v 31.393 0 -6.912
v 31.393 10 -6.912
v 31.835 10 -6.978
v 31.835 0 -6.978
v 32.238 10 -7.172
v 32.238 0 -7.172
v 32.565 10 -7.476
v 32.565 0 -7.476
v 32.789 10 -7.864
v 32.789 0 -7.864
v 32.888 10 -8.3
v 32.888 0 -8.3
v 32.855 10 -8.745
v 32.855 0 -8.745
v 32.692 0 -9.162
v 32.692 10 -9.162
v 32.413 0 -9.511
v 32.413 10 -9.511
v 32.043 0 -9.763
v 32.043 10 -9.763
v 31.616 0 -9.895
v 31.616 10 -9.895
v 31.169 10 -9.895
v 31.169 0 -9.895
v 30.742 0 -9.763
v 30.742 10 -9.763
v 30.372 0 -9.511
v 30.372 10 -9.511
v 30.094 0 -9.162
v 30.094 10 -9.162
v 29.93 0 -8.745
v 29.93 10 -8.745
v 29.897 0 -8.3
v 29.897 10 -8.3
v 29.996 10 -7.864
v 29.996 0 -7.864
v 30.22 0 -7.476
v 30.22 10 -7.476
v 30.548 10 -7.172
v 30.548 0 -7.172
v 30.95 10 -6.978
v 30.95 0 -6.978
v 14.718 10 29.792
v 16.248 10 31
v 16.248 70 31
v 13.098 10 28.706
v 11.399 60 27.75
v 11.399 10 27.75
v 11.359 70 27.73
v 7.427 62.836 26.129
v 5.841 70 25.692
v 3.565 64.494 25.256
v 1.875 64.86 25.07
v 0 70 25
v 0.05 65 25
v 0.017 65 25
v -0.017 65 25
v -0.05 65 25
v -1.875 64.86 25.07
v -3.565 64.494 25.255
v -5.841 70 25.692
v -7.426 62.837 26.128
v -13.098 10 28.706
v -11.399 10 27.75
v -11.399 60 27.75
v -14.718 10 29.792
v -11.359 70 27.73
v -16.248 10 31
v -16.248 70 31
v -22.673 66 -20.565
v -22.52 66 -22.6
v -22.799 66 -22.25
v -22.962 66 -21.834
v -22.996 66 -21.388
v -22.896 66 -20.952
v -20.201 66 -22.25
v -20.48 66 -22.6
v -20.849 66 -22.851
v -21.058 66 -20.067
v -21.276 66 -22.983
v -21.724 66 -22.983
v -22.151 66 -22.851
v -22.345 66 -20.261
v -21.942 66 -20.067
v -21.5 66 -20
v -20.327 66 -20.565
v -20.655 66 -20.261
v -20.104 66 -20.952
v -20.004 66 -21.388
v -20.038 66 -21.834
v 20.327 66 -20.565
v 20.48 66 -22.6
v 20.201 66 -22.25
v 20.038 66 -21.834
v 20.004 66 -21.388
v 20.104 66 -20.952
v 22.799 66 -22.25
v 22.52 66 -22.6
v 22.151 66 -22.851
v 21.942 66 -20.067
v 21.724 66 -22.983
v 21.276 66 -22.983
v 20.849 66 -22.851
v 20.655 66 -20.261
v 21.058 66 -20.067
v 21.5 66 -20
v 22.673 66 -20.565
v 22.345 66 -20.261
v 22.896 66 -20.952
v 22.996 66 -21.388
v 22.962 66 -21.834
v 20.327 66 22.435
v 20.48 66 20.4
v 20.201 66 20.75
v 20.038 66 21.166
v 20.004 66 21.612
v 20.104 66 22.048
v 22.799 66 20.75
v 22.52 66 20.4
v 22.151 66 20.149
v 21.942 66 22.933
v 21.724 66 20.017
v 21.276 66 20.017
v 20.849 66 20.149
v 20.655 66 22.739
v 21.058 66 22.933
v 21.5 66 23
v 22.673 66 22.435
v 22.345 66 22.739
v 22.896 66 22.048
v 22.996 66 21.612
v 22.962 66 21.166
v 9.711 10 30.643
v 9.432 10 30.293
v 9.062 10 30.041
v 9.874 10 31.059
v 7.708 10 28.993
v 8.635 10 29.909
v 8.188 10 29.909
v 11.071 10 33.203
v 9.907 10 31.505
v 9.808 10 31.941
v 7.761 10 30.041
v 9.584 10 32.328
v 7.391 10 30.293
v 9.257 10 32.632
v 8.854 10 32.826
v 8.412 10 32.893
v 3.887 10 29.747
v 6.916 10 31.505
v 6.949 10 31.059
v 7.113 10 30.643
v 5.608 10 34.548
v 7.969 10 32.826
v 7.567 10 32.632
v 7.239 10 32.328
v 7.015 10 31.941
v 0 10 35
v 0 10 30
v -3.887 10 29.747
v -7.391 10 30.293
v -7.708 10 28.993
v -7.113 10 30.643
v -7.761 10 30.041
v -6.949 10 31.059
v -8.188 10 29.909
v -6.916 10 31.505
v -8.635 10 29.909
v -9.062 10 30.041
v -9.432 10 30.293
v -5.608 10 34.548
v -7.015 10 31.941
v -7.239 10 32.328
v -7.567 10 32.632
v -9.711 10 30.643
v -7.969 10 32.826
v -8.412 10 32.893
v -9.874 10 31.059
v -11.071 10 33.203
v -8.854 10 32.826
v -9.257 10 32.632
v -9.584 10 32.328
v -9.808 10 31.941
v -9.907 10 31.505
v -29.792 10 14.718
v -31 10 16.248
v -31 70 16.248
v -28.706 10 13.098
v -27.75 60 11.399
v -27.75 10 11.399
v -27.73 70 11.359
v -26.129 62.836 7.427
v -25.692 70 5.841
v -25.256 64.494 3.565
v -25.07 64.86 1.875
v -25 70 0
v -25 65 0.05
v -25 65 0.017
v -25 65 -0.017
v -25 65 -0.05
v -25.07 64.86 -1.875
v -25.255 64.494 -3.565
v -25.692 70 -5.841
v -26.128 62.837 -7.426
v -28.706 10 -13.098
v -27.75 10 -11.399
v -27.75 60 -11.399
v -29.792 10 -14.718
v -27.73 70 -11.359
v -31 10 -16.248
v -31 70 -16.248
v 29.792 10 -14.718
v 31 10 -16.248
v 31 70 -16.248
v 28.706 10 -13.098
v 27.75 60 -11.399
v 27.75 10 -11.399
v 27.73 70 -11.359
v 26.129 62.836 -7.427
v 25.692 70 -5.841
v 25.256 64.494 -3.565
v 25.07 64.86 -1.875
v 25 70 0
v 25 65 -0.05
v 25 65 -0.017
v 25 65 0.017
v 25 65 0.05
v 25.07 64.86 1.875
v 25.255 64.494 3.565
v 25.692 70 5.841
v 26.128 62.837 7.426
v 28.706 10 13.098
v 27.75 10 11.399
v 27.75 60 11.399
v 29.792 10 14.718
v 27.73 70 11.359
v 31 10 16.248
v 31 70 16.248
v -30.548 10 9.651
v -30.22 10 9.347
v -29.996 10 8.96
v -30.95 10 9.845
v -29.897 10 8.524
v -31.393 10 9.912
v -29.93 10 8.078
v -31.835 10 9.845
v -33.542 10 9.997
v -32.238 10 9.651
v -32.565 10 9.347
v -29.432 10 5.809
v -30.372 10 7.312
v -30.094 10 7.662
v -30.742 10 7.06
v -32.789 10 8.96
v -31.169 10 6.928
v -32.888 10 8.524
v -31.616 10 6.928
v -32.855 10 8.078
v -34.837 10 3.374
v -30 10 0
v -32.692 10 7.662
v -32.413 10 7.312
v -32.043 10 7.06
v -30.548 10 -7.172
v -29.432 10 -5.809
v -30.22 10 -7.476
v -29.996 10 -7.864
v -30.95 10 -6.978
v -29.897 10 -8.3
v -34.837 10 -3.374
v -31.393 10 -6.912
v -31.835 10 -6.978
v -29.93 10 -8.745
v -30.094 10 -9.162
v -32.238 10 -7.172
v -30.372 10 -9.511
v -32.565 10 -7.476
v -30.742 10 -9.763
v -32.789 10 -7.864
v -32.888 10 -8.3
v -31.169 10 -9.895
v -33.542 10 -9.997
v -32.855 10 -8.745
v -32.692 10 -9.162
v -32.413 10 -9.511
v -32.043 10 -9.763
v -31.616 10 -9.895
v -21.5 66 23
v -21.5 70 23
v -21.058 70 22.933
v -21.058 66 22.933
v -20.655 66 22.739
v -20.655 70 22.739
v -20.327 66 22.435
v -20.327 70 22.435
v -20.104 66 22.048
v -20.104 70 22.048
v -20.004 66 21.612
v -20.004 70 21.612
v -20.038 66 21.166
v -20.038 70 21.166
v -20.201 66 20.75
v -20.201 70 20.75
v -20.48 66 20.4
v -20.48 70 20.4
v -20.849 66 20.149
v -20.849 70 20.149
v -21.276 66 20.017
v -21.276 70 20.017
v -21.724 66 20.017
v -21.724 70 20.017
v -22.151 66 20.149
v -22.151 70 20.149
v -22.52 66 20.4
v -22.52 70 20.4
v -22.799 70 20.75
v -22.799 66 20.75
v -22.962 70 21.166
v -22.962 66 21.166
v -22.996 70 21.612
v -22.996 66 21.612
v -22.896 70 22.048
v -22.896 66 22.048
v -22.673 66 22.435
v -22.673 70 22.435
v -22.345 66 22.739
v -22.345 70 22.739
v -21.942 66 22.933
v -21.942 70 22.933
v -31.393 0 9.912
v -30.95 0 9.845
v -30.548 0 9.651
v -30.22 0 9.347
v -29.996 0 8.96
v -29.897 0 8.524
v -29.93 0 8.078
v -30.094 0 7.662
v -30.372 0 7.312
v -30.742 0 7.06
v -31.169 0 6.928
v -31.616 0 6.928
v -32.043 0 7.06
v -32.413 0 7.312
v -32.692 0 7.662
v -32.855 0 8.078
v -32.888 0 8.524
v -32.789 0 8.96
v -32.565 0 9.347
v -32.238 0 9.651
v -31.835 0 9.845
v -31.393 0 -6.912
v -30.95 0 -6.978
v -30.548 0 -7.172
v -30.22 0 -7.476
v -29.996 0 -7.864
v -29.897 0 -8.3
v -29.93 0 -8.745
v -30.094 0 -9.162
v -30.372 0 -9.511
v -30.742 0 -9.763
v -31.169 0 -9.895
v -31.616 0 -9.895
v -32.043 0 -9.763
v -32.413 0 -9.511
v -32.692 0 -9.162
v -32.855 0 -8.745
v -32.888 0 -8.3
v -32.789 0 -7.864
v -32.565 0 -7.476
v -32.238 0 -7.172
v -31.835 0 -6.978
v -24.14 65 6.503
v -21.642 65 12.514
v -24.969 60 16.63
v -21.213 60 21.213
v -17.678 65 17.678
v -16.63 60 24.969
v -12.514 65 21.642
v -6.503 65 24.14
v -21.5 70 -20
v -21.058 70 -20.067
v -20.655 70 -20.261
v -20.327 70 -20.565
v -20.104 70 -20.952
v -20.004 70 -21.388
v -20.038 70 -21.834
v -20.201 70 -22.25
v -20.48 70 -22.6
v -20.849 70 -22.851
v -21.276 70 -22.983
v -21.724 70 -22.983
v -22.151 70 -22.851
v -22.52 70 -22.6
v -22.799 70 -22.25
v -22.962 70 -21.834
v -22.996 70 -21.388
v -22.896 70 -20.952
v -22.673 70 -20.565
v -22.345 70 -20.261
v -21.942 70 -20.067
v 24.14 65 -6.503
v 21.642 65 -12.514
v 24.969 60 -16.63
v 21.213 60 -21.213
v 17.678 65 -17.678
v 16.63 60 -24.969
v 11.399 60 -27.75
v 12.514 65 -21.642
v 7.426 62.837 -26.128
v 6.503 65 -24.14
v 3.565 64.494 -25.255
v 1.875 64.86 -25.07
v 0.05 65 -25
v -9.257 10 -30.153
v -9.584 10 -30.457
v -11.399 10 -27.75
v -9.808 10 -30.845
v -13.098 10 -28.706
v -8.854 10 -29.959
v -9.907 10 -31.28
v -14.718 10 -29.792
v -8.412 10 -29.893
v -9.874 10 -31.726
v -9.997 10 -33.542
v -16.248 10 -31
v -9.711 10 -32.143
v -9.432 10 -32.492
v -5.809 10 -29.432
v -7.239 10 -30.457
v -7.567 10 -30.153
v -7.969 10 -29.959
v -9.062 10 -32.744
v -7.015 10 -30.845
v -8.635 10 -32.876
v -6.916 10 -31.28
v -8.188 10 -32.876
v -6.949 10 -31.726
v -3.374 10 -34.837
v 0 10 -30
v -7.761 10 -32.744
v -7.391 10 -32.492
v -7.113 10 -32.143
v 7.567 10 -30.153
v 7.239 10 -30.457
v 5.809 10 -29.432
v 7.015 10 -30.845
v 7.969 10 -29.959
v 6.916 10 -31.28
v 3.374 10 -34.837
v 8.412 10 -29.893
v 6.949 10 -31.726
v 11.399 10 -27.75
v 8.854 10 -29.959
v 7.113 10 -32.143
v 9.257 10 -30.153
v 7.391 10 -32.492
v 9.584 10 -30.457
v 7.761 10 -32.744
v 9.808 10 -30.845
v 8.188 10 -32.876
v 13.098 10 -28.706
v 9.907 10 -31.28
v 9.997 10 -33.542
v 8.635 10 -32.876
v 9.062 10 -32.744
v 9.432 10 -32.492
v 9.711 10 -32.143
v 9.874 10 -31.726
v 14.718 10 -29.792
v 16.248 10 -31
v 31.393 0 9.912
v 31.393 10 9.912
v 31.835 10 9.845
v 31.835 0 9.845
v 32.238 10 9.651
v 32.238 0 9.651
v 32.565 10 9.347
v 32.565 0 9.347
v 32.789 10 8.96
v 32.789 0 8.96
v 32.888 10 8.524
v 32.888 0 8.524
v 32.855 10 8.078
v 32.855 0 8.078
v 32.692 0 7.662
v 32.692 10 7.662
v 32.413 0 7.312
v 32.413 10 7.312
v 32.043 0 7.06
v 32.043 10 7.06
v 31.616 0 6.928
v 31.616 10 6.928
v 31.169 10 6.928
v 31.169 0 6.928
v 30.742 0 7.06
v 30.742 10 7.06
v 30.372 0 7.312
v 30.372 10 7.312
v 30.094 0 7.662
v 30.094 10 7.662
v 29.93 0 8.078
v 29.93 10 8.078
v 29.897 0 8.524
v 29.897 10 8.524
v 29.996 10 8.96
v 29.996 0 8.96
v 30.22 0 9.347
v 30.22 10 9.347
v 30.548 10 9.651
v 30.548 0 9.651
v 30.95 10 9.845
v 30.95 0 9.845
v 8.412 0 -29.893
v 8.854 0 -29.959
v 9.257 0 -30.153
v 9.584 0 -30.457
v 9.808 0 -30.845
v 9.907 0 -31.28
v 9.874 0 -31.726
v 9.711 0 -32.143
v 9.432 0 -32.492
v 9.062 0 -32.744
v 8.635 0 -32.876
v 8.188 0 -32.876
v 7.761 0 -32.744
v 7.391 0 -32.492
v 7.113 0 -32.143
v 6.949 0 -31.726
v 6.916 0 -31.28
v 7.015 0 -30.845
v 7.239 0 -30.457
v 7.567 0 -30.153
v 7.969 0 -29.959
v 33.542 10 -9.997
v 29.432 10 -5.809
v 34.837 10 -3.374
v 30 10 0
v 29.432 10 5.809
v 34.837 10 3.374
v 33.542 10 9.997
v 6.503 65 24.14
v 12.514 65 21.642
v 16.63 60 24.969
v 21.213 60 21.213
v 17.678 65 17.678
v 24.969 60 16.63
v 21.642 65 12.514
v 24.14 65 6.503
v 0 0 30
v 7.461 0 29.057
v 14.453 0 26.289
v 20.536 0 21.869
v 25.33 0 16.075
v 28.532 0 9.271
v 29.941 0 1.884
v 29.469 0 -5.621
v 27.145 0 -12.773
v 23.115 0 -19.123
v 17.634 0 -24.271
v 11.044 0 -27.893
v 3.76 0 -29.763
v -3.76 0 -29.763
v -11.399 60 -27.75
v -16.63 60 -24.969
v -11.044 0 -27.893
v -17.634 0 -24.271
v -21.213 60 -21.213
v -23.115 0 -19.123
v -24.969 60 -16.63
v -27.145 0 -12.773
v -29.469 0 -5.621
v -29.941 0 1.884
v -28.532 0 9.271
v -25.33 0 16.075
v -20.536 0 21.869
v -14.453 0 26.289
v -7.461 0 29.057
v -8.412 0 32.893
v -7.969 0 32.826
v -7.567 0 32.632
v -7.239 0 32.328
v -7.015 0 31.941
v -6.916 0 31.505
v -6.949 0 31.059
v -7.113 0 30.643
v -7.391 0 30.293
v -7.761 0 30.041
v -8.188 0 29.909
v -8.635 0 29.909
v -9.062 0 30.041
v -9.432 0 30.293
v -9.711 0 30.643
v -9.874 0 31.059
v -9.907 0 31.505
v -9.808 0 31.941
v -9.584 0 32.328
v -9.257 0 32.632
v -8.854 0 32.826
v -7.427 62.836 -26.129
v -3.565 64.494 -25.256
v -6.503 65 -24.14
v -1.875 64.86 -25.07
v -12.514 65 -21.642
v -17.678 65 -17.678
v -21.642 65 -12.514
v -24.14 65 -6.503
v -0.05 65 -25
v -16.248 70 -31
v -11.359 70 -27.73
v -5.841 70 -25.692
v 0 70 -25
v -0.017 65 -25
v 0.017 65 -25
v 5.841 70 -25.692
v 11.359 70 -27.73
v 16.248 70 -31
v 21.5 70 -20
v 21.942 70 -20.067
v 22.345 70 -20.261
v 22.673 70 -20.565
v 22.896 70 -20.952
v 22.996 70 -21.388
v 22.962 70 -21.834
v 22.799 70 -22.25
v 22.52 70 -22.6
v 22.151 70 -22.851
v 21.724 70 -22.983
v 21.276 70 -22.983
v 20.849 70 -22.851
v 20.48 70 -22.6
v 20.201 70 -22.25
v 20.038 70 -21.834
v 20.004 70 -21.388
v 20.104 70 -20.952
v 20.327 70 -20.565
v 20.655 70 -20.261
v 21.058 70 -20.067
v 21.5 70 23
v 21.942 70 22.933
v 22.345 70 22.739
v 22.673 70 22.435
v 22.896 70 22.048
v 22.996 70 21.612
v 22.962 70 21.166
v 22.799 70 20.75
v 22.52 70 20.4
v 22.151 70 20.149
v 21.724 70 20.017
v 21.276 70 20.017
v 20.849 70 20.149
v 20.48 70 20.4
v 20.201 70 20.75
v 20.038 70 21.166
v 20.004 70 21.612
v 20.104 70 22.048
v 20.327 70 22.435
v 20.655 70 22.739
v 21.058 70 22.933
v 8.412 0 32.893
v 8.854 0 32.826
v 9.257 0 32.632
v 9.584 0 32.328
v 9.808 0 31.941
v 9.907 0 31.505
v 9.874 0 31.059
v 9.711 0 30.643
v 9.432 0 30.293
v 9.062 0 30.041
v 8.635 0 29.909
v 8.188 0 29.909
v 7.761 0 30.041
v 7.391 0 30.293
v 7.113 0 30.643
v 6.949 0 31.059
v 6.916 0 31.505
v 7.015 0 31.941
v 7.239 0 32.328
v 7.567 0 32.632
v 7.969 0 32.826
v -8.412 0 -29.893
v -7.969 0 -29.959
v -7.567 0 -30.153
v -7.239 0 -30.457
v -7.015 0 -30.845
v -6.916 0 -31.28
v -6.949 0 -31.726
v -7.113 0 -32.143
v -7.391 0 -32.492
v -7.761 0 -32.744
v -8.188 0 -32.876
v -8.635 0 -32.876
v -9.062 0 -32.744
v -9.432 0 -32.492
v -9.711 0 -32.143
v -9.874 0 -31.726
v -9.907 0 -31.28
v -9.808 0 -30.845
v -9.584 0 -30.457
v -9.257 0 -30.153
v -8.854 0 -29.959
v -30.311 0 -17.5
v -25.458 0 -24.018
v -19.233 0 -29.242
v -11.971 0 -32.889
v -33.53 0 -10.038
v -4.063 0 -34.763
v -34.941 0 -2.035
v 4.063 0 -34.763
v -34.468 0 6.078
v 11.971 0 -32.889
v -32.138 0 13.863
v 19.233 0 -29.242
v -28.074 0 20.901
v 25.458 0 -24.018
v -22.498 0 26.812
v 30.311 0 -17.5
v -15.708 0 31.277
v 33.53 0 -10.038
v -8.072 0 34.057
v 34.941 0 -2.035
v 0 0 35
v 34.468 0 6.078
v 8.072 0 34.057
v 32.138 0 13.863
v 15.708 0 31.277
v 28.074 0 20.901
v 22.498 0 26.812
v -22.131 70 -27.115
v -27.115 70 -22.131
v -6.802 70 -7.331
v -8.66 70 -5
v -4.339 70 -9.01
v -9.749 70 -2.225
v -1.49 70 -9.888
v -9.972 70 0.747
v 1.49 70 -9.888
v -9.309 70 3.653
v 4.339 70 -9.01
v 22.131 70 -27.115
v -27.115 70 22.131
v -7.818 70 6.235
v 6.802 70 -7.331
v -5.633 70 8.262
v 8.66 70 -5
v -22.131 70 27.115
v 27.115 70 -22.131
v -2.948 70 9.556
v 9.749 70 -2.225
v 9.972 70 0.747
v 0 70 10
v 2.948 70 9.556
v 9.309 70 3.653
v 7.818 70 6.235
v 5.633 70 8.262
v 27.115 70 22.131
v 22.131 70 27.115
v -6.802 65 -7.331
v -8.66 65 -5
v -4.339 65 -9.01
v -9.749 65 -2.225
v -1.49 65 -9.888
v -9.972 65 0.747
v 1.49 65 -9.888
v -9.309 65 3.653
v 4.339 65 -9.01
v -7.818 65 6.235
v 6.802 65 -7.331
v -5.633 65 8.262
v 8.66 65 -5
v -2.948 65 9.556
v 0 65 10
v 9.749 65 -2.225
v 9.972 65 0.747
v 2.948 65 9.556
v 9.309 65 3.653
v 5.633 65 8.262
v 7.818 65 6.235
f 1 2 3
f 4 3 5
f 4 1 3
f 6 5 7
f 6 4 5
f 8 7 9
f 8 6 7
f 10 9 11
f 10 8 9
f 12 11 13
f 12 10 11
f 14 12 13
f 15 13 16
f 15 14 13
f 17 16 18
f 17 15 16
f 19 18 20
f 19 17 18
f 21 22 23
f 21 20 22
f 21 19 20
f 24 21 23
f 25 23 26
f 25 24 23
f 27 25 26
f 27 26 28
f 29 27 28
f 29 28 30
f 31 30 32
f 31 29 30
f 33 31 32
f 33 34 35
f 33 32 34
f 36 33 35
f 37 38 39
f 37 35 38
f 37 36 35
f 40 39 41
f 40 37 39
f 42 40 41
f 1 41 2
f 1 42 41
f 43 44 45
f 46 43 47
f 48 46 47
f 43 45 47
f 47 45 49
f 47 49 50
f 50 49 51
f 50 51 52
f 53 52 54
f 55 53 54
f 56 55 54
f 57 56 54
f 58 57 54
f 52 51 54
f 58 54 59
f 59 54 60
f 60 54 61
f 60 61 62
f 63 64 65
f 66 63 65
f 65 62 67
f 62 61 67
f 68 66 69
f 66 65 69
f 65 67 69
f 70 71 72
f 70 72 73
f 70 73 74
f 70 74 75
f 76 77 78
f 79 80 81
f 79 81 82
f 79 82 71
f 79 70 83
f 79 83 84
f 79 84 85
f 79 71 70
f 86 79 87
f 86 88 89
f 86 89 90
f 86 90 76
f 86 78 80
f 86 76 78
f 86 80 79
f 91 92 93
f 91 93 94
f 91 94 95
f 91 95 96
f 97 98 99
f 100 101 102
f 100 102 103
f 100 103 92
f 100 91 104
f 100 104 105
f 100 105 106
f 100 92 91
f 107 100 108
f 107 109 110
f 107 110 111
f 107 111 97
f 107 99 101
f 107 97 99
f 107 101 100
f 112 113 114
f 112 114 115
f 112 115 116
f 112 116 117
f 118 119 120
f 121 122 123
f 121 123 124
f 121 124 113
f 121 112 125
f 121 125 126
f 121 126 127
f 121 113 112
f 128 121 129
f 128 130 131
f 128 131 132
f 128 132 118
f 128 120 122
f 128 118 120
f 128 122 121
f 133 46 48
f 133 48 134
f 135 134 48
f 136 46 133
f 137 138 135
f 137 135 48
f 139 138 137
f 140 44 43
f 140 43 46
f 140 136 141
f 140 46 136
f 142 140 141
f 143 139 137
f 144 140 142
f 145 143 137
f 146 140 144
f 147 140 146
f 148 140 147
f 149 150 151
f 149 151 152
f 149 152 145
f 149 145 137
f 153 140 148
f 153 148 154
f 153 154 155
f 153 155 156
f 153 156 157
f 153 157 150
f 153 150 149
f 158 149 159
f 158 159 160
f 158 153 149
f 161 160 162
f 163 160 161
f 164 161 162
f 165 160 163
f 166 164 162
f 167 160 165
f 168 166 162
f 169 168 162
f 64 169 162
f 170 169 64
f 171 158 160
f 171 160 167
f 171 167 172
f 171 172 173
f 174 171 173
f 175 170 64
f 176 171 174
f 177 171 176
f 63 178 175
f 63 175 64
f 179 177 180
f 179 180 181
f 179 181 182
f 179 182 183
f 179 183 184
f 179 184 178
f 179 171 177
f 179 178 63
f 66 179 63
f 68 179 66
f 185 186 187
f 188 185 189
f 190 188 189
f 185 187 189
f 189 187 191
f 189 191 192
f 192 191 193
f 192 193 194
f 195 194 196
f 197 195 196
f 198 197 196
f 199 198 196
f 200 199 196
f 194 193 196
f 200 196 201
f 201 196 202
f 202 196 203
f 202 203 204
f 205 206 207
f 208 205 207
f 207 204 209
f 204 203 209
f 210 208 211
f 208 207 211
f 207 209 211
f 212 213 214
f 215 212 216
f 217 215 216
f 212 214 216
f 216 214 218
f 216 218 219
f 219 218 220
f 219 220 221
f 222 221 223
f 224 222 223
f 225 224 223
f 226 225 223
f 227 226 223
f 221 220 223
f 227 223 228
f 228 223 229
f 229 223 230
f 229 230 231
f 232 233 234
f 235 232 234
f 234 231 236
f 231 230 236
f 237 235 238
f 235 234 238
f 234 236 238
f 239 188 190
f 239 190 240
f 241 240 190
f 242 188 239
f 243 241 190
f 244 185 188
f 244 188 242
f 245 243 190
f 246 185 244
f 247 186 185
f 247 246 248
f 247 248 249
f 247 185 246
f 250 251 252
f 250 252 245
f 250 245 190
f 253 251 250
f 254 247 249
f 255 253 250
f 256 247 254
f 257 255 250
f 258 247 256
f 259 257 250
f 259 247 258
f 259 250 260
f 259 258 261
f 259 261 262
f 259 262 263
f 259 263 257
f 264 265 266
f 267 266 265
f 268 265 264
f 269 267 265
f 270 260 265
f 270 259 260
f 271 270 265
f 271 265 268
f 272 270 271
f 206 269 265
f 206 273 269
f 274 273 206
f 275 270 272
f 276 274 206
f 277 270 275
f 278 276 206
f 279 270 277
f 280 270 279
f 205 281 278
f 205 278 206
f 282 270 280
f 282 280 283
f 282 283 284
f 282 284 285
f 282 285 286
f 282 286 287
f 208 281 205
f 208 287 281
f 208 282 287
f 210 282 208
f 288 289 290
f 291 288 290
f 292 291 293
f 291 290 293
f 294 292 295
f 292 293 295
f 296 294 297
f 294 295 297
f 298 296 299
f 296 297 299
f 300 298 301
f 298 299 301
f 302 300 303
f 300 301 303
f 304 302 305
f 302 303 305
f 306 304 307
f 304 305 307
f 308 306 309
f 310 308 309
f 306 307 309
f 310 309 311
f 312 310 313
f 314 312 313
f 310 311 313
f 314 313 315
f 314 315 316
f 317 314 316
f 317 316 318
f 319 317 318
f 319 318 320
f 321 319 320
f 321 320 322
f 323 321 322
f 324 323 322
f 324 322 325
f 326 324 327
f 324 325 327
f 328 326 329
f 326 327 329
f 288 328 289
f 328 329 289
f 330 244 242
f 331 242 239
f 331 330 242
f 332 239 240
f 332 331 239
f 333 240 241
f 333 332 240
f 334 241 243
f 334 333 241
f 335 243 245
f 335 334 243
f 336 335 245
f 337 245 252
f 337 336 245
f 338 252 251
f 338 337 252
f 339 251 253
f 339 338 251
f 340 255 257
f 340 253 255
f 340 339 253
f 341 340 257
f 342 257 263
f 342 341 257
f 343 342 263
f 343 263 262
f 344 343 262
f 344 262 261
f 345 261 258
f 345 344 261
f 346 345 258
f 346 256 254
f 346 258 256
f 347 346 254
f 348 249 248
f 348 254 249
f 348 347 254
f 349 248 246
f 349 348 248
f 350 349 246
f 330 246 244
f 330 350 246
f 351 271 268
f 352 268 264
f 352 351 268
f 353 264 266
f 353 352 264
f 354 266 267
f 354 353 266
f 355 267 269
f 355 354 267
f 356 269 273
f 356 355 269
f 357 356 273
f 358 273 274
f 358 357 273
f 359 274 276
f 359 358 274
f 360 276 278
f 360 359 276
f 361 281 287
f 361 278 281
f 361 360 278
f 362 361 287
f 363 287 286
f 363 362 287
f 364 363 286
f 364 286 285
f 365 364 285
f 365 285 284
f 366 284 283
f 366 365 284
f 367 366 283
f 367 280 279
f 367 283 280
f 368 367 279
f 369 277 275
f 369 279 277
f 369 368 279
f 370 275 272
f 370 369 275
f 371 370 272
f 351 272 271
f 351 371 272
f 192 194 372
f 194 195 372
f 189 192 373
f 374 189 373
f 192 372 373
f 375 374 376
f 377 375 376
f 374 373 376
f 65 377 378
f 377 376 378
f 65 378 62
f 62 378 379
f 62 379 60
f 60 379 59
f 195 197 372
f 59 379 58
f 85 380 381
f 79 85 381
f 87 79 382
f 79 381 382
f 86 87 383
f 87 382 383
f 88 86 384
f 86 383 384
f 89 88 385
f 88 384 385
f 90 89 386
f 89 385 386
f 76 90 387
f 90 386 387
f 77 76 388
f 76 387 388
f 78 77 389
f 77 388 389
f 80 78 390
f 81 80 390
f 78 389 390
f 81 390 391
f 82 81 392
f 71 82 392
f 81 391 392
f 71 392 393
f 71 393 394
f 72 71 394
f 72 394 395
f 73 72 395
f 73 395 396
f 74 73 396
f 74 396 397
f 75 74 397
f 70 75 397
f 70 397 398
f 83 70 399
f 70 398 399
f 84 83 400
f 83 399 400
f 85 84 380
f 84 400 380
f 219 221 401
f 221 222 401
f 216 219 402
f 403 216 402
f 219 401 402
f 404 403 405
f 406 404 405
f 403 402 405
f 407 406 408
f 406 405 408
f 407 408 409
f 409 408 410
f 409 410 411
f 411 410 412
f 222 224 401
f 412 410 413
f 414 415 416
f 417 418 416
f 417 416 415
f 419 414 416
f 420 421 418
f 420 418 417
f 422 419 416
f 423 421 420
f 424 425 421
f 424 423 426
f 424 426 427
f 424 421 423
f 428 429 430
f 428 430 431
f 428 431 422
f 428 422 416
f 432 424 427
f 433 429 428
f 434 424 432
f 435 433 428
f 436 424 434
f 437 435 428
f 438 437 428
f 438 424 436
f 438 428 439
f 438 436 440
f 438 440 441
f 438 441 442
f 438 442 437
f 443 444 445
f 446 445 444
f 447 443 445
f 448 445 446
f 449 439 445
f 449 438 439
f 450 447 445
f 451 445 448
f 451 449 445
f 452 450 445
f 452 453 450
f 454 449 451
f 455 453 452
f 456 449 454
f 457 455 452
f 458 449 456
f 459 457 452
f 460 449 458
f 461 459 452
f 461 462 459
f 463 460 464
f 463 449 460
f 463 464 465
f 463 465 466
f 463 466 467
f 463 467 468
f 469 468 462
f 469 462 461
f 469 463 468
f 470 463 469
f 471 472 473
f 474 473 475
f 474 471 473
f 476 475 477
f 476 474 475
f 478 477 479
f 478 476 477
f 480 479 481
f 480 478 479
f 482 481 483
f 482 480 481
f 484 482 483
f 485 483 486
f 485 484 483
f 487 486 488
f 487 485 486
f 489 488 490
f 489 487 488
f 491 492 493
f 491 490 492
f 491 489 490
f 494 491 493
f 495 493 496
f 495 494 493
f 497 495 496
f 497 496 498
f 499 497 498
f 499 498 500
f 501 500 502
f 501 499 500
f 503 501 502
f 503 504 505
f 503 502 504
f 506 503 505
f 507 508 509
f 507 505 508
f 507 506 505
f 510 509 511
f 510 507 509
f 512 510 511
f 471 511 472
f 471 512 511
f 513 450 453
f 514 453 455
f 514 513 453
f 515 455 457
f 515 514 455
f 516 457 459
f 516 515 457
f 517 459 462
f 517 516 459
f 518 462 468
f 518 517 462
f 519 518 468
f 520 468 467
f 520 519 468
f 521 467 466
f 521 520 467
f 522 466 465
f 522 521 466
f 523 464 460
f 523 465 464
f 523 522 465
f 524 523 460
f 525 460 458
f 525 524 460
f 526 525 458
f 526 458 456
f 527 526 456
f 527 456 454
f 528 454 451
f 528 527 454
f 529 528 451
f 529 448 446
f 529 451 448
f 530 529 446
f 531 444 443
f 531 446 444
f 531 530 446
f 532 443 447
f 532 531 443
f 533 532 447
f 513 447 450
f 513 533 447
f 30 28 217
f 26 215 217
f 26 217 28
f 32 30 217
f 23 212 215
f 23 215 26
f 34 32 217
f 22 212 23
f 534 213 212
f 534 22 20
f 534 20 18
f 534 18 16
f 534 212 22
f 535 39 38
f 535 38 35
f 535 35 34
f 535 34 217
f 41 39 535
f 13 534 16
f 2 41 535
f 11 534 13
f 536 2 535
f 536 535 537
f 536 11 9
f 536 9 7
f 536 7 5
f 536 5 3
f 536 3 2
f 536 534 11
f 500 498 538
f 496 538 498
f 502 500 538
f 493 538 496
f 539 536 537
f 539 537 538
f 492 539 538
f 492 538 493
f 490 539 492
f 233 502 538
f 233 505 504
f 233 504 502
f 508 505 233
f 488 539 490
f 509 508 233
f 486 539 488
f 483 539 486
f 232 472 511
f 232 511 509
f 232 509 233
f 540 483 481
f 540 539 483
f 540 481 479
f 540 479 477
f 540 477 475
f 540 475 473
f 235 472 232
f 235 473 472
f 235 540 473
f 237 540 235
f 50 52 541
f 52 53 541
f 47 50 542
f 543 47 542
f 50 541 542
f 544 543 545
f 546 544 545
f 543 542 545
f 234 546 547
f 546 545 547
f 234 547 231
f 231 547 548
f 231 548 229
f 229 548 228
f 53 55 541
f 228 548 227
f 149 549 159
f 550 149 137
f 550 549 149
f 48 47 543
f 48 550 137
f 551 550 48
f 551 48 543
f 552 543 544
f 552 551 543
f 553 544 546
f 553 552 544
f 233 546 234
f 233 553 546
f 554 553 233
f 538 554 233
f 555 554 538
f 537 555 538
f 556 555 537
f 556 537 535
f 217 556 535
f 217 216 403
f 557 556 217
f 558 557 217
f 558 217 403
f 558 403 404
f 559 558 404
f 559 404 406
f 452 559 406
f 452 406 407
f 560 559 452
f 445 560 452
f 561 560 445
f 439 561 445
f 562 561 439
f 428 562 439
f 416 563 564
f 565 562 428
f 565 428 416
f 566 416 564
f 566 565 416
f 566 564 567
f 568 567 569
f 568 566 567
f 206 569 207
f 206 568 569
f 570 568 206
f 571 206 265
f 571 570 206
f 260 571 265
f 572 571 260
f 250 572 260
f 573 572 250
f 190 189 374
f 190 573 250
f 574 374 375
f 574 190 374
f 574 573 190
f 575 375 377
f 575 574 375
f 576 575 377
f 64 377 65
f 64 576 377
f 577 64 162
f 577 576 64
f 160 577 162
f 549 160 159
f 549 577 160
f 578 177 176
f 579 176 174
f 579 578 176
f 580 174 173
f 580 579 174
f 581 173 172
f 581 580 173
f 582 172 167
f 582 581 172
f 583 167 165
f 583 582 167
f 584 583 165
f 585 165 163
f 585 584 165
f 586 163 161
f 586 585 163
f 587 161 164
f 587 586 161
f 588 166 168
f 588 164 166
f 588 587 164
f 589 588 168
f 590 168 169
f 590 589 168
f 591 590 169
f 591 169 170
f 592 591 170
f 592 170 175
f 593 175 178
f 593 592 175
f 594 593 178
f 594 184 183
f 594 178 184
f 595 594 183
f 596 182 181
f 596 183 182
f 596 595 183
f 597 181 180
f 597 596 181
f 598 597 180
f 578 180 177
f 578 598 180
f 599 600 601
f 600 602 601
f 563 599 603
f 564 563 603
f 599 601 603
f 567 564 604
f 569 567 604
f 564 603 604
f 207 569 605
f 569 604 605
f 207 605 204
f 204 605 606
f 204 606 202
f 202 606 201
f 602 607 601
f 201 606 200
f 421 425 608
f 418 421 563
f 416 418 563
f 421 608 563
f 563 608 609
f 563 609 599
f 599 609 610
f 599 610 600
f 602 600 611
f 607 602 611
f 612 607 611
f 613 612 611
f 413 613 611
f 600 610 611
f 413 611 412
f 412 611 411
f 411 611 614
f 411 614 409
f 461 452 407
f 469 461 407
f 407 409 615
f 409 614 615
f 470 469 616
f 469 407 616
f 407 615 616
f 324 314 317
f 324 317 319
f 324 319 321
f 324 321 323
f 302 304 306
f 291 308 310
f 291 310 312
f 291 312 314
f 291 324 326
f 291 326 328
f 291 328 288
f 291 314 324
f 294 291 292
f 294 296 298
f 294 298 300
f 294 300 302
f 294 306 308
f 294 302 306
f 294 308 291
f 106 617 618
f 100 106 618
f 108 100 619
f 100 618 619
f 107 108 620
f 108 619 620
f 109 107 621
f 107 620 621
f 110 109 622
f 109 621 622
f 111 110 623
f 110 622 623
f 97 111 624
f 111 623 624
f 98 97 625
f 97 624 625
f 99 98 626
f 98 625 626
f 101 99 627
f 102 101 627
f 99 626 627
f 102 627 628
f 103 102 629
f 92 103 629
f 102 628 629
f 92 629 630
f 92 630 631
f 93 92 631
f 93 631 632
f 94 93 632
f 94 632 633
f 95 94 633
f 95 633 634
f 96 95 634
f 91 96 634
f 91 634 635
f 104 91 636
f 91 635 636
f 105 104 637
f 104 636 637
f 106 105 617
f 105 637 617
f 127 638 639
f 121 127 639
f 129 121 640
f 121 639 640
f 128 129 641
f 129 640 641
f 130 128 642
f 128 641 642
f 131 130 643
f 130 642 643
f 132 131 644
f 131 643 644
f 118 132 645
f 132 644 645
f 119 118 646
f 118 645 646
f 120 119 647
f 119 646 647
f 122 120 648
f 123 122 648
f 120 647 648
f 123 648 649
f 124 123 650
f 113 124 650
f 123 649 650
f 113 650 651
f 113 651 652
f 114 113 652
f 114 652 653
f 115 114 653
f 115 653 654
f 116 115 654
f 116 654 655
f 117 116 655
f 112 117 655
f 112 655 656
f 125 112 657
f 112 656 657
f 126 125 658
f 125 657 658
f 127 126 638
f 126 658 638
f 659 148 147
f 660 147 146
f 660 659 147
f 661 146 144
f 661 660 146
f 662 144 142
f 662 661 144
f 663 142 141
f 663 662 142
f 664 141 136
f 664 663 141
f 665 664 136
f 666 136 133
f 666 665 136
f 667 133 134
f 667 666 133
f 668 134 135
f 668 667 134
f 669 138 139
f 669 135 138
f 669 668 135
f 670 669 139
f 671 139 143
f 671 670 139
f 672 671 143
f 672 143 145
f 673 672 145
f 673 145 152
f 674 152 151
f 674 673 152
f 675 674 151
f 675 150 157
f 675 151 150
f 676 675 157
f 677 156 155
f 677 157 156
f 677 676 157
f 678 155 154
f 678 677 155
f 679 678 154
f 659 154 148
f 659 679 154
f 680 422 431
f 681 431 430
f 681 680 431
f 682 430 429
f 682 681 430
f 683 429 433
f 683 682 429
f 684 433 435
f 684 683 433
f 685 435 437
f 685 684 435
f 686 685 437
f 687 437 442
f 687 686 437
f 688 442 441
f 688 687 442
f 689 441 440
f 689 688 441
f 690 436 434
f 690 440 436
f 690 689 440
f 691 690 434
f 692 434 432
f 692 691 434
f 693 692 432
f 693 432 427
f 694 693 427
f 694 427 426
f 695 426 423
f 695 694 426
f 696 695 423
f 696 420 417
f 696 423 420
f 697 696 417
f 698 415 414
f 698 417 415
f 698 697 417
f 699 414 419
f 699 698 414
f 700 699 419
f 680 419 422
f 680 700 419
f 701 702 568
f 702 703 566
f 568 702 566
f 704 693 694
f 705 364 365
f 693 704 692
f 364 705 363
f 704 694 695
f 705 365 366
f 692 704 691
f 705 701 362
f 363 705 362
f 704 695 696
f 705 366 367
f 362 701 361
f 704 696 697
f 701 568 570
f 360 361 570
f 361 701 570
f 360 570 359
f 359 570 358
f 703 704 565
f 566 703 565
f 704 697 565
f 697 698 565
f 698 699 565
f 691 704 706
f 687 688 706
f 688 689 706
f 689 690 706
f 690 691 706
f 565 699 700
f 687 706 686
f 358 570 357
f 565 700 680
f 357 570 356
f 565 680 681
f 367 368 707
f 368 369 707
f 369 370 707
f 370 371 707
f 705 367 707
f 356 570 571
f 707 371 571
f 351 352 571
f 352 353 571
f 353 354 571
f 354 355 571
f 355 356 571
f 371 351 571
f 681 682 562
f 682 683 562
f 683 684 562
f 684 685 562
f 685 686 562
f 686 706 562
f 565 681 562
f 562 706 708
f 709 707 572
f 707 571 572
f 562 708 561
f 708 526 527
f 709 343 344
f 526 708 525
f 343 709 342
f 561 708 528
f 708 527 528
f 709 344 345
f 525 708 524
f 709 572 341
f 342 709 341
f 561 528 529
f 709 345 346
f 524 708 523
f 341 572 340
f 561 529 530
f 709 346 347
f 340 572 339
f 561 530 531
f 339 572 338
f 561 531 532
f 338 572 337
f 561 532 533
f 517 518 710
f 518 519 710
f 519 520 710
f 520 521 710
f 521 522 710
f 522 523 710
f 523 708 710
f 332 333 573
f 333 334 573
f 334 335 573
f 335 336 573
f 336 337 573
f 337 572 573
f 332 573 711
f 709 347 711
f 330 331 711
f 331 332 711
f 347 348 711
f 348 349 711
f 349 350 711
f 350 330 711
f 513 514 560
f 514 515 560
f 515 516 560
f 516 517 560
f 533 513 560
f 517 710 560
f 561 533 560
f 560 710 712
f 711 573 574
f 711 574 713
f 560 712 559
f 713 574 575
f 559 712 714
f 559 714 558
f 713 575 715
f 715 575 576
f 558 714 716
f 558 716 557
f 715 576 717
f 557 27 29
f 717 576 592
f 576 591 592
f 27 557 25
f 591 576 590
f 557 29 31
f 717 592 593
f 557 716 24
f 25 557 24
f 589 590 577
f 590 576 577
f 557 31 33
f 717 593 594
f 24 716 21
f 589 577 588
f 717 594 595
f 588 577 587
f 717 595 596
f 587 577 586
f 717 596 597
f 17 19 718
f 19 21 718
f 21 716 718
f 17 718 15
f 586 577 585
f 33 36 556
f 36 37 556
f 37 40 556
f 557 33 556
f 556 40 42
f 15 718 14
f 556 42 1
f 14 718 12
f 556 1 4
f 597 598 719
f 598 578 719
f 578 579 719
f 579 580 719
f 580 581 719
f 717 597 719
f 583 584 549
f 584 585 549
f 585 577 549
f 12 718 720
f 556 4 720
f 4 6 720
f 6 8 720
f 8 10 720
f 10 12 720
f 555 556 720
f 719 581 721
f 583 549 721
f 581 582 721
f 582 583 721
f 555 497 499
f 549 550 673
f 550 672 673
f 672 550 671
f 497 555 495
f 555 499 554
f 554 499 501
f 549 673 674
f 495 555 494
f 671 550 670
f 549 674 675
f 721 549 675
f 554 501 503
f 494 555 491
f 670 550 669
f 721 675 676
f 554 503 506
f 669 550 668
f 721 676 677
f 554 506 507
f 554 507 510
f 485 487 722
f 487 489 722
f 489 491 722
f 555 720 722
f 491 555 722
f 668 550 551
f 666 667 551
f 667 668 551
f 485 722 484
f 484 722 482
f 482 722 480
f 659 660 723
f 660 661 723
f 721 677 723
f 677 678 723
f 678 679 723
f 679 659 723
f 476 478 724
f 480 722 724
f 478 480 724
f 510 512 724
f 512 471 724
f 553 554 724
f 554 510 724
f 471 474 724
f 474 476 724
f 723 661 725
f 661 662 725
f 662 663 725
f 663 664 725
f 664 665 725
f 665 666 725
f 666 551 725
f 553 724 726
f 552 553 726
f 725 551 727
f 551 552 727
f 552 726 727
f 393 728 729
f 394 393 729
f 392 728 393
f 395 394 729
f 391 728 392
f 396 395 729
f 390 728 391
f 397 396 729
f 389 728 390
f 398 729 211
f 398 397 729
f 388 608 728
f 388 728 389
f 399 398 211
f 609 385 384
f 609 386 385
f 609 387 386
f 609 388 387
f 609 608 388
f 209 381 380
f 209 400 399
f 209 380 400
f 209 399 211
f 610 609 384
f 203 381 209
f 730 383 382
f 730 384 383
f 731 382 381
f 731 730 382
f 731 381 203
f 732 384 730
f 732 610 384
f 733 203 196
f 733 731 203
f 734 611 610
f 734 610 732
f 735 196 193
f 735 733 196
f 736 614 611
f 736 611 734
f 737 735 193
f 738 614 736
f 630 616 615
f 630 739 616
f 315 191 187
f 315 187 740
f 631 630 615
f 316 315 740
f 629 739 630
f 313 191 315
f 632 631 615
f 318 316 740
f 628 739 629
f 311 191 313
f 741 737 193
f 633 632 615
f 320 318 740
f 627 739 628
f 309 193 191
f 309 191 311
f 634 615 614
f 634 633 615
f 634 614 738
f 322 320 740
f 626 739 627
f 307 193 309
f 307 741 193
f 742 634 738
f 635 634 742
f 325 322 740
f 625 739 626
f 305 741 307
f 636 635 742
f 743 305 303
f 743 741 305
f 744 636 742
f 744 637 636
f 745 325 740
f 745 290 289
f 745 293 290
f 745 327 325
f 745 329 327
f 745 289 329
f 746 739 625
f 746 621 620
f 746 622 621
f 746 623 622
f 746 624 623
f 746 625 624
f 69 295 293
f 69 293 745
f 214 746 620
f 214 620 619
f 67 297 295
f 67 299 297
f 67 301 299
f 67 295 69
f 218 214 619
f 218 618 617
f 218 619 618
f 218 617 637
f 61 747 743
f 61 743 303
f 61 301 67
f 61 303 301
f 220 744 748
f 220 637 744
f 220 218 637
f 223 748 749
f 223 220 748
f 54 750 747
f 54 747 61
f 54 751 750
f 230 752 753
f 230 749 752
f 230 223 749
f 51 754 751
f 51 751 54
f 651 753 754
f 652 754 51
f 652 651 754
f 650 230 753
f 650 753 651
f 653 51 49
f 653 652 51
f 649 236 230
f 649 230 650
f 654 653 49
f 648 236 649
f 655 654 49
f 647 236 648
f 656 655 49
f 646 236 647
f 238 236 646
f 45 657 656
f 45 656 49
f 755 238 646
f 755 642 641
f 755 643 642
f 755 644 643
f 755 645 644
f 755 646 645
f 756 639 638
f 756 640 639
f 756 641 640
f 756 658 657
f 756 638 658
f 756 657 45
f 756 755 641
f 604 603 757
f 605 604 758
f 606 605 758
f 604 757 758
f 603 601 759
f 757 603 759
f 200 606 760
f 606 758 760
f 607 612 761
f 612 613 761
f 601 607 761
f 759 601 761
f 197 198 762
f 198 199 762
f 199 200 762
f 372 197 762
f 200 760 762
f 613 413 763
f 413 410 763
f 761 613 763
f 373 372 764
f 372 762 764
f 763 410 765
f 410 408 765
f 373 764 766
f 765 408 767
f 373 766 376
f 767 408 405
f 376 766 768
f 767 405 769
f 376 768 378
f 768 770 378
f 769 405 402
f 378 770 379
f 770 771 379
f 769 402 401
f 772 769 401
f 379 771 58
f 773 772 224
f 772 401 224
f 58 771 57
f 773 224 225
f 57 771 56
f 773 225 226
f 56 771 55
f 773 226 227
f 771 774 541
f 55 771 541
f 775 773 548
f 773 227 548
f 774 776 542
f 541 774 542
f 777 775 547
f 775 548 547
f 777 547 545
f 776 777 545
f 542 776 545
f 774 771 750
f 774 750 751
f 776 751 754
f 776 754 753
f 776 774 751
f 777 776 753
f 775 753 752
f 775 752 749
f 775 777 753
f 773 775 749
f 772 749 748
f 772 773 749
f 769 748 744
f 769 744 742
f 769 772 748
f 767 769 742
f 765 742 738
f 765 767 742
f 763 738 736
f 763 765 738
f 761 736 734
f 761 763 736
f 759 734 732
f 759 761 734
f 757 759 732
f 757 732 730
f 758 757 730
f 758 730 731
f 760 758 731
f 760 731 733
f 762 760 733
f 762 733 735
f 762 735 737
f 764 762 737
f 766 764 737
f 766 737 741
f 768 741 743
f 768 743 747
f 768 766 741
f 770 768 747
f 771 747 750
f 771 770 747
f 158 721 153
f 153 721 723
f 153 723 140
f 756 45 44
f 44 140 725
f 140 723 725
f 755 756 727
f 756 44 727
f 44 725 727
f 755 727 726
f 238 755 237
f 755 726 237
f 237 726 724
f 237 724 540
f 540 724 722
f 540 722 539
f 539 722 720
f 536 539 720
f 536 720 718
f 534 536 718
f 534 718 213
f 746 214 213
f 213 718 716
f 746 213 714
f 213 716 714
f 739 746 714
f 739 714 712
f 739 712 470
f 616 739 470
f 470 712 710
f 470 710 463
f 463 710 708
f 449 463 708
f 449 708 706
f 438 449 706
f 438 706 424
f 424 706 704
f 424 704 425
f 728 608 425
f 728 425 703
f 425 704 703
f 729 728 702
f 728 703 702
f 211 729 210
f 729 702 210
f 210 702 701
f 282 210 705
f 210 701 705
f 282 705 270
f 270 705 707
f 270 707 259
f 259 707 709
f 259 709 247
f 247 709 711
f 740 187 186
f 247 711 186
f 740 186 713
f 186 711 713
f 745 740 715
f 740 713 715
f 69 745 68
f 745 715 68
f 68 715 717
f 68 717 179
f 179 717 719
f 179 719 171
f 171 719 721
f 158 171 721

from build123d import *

# Parameters (mm, degrees)
SKETCH1_R           = 35
SKETCH1_R_2         = 30
SKETCH1_R_3         = 1.5
BOSS_EXTRUDE1_DEPTH = 65
SKETCH2_R           = 35
SKETCH2_R_2         = 1.5
SKETCH2_R_3         = 10
BOSS_EXTRUDE2_DEPTH = 5
SKETCH3_R           = 25
CUT_EXTRUDE1_DEPTH  = 60
CIRPATTERN1_COUNT   = 4
CHAMFER1_SIZE       = 5
SKETCH4_R           = 1.5
CUT_EXTRUDE2_DEPTH  = 4


with BuildPart() as part:
    # Sketch1 → Boss-Extrude1 (new body)
    with BuildSketch(Plane(origin=(0, 0, 0), x_dir=(1, 0, 0), z_dir=(0, 1, 0))):
        with Locations(Location((0, 0, 0), (0, 0, 270))):
            Circle(SKETCH1_R)
        with Locations(Location((0, 0, 0), (0, 0, 270))):
            Circle(SKETCH1_R_2, mode=Mode.SUBTRACT)
        with Locations(Location((-8.411618966, 31.392589354, 0), (0, 0, 270))):
            Circle(SKETCH1_R_3, mode=Mode.SUBTRACT)
        with Locations(Location((8.411618966, 31.392589354, 0), (0, 0, 270))):
            Circle(SKETCH1_R_3, mode=Mode.SUBTRACT)
        with Locations(Location((31.392589354, 8.411618966, 0), (0, 0, 270))):
            Circle(SKETCH1_R_3, mode=Mode.SUBTRACT)
        with Locations(Location((31.392589354, -8.411618966, 0), (0, 0, 270))):
            Circle(SKETCH1_R_3, mode=Mode.SUBTRACT)
        with Locations(Location((8.411618966, -31.392589354, 0), (0, 0, 270))):
            Circle(SKETCH1_R_3, mode=Mode.SUBTRACT)
        with Locations(Location((-8.411618966, -31.392589354, 0), (0, 0, 270))):
            Circle(SKETCH1_R_3, mode=Mode.SUBTRACT)
        with Locations(Location((-31.392589354, -8.411618966, 0), (0, 0, 270))):
            Circle(SKETCH1_R_3, mode=Mode.SUBTRACT)
        with Locations(Location((-31.392589354, 8.411618966, 0), (0, 0, 270))):
            Circle(SKETCH1_R_3, mode=Mode.SUBTRACT)
    extrude(amount=BOSS_EXTRUDE1_DEPTH)

    # Sketch2 → Boss-Extrude2 (add)
    with BuildSketch(Plane(origin=(0, 65, 0), x_dir=(1, 0, 0), z_dir=(0, 1, 0))):
        with Locations(Location((0, 0, 0), (0, 0, 270))):
            Circle(SKETCH2_R)
        with Locations(Location((-8.411618966, 31.392589354, 0), (0, 0, 270))):
            Circle(SKETCH2_R_2, mode=Mode.SUBTRACT)
        with Locations(Location((8.411618966, 31.392589354, 0), (0, 0, 270))):
            Circle(SKETCH2_R_2, mode=Mode.SUBTRACT)
        with Locations(Location((31.392589354, 8.411618966, 0), (0, 0, 270))):
            Circle(SKETCH2_R_2, mode=Mode.SUBTRACT)
        with Locations(Location((31.392589354, -8.411618966, 0), (0, 0, 270))):
            Circle(SKETCH2_R_2, mode=Mode.SUBTRACT)
        with Locations(Location((8.411618966, -31.392589354, 0), (0, 0, 270))):
            Circle(SKETCH2_R_2, mode=Mode.SUBTRACT)
        with Locations(Location((-8.411618966, -31.392589354, 0), (0, 0, 270))):
            Circle(SKETCH2_R_2, mode=Mode.SUBTRACT)
        with Locations(Location((-31.392589354, -8.411618966, 0), (0, 0, 270))):
            Circle(SKETCH2_R_2, mode=Mode.SUBTRACT)
        with Locations(Location((-31.392589354, 8.411618966, 0), (0, 0, 270))):
            Circle(SKETCH2_R_2, mode=Mode.SUBTRACT)
        with Locations(Location((0, 0, 0), (0, 0, 270))):
            Circle(SKETCH2_R_3, mode=Mode.SUBTRACT)
    extrude(amount=BOSS_EXTRUDE2_DEPTH)

    # Sketch3 → Cut-Extrude1 (cut)
    with BuildSketch(Plane(origin=(0, 70, 0), x_dir=(1, 0, 0), z_dir=(0, 1, 0))):
        with Locations((0, 50)):
            Circle(SKETCH3_R)
    cut_extrude1 = extrude(amount=-CUT_EXTRUDE1_DEPTH, mode=Mode.SUBTRACT)

    # CirPattern1: Cut-Extrude1 ×4 about axis
    cirpattern1_axis = Axis((0, 0, 0), (0, 1, 0))
    for i in range(1, CIRPATTERN1_COUNT):
        add(cut_extrude1.rotate(cirpattern1_axis, i * 360 / CIRPATTERN1_COUNT), mode=Mode.SUBTRACT)

    # Chamfer1
    chamfer1_edges = [part.edges().sort_by_distance(p)[0] for p in [
        (-21.213203436, 65, -21.213203436),
        (21.213203436, 65, 21.213203436),
        (21.213203436, 65, -21.213203436),
        (-21.213203436, 65, 21.213203436),
    ]]
    chamfer(chamfer1_edges, length=CHAMFER1_SIZE - 0.0001)  # a hair under: the kernel refuses the full size

    # Sketch4 → Cut-Extrude2 (cut)
    with BuildSketch(Plane(origin=(0, 70, 0), x_dir=(1, 0, 0), z_dir=(0, 1, 0))):
        with Locations(Location((-21.5, 21.5, 0), (0, 0, 270))):
            Circle(SKETCH4_R)
        with Locations(Location((21.5, 21.5, 0), (0, 0, 270))):
            Circle(SKETCH4_R)
        with Locations(Location((21.5, -21.5, 0), (0, 0, 270))):
            Circle(SKETCH4_R)
        with Locations(Location((-21.5, -21.5, 0), (0, 0, 270))):
            Circle(SKETCH4_R)
    extrude(amount=-CUT_EXTRUDE2_DEPTH, mode=Mode.SUBTRACT)


solid = part.part
